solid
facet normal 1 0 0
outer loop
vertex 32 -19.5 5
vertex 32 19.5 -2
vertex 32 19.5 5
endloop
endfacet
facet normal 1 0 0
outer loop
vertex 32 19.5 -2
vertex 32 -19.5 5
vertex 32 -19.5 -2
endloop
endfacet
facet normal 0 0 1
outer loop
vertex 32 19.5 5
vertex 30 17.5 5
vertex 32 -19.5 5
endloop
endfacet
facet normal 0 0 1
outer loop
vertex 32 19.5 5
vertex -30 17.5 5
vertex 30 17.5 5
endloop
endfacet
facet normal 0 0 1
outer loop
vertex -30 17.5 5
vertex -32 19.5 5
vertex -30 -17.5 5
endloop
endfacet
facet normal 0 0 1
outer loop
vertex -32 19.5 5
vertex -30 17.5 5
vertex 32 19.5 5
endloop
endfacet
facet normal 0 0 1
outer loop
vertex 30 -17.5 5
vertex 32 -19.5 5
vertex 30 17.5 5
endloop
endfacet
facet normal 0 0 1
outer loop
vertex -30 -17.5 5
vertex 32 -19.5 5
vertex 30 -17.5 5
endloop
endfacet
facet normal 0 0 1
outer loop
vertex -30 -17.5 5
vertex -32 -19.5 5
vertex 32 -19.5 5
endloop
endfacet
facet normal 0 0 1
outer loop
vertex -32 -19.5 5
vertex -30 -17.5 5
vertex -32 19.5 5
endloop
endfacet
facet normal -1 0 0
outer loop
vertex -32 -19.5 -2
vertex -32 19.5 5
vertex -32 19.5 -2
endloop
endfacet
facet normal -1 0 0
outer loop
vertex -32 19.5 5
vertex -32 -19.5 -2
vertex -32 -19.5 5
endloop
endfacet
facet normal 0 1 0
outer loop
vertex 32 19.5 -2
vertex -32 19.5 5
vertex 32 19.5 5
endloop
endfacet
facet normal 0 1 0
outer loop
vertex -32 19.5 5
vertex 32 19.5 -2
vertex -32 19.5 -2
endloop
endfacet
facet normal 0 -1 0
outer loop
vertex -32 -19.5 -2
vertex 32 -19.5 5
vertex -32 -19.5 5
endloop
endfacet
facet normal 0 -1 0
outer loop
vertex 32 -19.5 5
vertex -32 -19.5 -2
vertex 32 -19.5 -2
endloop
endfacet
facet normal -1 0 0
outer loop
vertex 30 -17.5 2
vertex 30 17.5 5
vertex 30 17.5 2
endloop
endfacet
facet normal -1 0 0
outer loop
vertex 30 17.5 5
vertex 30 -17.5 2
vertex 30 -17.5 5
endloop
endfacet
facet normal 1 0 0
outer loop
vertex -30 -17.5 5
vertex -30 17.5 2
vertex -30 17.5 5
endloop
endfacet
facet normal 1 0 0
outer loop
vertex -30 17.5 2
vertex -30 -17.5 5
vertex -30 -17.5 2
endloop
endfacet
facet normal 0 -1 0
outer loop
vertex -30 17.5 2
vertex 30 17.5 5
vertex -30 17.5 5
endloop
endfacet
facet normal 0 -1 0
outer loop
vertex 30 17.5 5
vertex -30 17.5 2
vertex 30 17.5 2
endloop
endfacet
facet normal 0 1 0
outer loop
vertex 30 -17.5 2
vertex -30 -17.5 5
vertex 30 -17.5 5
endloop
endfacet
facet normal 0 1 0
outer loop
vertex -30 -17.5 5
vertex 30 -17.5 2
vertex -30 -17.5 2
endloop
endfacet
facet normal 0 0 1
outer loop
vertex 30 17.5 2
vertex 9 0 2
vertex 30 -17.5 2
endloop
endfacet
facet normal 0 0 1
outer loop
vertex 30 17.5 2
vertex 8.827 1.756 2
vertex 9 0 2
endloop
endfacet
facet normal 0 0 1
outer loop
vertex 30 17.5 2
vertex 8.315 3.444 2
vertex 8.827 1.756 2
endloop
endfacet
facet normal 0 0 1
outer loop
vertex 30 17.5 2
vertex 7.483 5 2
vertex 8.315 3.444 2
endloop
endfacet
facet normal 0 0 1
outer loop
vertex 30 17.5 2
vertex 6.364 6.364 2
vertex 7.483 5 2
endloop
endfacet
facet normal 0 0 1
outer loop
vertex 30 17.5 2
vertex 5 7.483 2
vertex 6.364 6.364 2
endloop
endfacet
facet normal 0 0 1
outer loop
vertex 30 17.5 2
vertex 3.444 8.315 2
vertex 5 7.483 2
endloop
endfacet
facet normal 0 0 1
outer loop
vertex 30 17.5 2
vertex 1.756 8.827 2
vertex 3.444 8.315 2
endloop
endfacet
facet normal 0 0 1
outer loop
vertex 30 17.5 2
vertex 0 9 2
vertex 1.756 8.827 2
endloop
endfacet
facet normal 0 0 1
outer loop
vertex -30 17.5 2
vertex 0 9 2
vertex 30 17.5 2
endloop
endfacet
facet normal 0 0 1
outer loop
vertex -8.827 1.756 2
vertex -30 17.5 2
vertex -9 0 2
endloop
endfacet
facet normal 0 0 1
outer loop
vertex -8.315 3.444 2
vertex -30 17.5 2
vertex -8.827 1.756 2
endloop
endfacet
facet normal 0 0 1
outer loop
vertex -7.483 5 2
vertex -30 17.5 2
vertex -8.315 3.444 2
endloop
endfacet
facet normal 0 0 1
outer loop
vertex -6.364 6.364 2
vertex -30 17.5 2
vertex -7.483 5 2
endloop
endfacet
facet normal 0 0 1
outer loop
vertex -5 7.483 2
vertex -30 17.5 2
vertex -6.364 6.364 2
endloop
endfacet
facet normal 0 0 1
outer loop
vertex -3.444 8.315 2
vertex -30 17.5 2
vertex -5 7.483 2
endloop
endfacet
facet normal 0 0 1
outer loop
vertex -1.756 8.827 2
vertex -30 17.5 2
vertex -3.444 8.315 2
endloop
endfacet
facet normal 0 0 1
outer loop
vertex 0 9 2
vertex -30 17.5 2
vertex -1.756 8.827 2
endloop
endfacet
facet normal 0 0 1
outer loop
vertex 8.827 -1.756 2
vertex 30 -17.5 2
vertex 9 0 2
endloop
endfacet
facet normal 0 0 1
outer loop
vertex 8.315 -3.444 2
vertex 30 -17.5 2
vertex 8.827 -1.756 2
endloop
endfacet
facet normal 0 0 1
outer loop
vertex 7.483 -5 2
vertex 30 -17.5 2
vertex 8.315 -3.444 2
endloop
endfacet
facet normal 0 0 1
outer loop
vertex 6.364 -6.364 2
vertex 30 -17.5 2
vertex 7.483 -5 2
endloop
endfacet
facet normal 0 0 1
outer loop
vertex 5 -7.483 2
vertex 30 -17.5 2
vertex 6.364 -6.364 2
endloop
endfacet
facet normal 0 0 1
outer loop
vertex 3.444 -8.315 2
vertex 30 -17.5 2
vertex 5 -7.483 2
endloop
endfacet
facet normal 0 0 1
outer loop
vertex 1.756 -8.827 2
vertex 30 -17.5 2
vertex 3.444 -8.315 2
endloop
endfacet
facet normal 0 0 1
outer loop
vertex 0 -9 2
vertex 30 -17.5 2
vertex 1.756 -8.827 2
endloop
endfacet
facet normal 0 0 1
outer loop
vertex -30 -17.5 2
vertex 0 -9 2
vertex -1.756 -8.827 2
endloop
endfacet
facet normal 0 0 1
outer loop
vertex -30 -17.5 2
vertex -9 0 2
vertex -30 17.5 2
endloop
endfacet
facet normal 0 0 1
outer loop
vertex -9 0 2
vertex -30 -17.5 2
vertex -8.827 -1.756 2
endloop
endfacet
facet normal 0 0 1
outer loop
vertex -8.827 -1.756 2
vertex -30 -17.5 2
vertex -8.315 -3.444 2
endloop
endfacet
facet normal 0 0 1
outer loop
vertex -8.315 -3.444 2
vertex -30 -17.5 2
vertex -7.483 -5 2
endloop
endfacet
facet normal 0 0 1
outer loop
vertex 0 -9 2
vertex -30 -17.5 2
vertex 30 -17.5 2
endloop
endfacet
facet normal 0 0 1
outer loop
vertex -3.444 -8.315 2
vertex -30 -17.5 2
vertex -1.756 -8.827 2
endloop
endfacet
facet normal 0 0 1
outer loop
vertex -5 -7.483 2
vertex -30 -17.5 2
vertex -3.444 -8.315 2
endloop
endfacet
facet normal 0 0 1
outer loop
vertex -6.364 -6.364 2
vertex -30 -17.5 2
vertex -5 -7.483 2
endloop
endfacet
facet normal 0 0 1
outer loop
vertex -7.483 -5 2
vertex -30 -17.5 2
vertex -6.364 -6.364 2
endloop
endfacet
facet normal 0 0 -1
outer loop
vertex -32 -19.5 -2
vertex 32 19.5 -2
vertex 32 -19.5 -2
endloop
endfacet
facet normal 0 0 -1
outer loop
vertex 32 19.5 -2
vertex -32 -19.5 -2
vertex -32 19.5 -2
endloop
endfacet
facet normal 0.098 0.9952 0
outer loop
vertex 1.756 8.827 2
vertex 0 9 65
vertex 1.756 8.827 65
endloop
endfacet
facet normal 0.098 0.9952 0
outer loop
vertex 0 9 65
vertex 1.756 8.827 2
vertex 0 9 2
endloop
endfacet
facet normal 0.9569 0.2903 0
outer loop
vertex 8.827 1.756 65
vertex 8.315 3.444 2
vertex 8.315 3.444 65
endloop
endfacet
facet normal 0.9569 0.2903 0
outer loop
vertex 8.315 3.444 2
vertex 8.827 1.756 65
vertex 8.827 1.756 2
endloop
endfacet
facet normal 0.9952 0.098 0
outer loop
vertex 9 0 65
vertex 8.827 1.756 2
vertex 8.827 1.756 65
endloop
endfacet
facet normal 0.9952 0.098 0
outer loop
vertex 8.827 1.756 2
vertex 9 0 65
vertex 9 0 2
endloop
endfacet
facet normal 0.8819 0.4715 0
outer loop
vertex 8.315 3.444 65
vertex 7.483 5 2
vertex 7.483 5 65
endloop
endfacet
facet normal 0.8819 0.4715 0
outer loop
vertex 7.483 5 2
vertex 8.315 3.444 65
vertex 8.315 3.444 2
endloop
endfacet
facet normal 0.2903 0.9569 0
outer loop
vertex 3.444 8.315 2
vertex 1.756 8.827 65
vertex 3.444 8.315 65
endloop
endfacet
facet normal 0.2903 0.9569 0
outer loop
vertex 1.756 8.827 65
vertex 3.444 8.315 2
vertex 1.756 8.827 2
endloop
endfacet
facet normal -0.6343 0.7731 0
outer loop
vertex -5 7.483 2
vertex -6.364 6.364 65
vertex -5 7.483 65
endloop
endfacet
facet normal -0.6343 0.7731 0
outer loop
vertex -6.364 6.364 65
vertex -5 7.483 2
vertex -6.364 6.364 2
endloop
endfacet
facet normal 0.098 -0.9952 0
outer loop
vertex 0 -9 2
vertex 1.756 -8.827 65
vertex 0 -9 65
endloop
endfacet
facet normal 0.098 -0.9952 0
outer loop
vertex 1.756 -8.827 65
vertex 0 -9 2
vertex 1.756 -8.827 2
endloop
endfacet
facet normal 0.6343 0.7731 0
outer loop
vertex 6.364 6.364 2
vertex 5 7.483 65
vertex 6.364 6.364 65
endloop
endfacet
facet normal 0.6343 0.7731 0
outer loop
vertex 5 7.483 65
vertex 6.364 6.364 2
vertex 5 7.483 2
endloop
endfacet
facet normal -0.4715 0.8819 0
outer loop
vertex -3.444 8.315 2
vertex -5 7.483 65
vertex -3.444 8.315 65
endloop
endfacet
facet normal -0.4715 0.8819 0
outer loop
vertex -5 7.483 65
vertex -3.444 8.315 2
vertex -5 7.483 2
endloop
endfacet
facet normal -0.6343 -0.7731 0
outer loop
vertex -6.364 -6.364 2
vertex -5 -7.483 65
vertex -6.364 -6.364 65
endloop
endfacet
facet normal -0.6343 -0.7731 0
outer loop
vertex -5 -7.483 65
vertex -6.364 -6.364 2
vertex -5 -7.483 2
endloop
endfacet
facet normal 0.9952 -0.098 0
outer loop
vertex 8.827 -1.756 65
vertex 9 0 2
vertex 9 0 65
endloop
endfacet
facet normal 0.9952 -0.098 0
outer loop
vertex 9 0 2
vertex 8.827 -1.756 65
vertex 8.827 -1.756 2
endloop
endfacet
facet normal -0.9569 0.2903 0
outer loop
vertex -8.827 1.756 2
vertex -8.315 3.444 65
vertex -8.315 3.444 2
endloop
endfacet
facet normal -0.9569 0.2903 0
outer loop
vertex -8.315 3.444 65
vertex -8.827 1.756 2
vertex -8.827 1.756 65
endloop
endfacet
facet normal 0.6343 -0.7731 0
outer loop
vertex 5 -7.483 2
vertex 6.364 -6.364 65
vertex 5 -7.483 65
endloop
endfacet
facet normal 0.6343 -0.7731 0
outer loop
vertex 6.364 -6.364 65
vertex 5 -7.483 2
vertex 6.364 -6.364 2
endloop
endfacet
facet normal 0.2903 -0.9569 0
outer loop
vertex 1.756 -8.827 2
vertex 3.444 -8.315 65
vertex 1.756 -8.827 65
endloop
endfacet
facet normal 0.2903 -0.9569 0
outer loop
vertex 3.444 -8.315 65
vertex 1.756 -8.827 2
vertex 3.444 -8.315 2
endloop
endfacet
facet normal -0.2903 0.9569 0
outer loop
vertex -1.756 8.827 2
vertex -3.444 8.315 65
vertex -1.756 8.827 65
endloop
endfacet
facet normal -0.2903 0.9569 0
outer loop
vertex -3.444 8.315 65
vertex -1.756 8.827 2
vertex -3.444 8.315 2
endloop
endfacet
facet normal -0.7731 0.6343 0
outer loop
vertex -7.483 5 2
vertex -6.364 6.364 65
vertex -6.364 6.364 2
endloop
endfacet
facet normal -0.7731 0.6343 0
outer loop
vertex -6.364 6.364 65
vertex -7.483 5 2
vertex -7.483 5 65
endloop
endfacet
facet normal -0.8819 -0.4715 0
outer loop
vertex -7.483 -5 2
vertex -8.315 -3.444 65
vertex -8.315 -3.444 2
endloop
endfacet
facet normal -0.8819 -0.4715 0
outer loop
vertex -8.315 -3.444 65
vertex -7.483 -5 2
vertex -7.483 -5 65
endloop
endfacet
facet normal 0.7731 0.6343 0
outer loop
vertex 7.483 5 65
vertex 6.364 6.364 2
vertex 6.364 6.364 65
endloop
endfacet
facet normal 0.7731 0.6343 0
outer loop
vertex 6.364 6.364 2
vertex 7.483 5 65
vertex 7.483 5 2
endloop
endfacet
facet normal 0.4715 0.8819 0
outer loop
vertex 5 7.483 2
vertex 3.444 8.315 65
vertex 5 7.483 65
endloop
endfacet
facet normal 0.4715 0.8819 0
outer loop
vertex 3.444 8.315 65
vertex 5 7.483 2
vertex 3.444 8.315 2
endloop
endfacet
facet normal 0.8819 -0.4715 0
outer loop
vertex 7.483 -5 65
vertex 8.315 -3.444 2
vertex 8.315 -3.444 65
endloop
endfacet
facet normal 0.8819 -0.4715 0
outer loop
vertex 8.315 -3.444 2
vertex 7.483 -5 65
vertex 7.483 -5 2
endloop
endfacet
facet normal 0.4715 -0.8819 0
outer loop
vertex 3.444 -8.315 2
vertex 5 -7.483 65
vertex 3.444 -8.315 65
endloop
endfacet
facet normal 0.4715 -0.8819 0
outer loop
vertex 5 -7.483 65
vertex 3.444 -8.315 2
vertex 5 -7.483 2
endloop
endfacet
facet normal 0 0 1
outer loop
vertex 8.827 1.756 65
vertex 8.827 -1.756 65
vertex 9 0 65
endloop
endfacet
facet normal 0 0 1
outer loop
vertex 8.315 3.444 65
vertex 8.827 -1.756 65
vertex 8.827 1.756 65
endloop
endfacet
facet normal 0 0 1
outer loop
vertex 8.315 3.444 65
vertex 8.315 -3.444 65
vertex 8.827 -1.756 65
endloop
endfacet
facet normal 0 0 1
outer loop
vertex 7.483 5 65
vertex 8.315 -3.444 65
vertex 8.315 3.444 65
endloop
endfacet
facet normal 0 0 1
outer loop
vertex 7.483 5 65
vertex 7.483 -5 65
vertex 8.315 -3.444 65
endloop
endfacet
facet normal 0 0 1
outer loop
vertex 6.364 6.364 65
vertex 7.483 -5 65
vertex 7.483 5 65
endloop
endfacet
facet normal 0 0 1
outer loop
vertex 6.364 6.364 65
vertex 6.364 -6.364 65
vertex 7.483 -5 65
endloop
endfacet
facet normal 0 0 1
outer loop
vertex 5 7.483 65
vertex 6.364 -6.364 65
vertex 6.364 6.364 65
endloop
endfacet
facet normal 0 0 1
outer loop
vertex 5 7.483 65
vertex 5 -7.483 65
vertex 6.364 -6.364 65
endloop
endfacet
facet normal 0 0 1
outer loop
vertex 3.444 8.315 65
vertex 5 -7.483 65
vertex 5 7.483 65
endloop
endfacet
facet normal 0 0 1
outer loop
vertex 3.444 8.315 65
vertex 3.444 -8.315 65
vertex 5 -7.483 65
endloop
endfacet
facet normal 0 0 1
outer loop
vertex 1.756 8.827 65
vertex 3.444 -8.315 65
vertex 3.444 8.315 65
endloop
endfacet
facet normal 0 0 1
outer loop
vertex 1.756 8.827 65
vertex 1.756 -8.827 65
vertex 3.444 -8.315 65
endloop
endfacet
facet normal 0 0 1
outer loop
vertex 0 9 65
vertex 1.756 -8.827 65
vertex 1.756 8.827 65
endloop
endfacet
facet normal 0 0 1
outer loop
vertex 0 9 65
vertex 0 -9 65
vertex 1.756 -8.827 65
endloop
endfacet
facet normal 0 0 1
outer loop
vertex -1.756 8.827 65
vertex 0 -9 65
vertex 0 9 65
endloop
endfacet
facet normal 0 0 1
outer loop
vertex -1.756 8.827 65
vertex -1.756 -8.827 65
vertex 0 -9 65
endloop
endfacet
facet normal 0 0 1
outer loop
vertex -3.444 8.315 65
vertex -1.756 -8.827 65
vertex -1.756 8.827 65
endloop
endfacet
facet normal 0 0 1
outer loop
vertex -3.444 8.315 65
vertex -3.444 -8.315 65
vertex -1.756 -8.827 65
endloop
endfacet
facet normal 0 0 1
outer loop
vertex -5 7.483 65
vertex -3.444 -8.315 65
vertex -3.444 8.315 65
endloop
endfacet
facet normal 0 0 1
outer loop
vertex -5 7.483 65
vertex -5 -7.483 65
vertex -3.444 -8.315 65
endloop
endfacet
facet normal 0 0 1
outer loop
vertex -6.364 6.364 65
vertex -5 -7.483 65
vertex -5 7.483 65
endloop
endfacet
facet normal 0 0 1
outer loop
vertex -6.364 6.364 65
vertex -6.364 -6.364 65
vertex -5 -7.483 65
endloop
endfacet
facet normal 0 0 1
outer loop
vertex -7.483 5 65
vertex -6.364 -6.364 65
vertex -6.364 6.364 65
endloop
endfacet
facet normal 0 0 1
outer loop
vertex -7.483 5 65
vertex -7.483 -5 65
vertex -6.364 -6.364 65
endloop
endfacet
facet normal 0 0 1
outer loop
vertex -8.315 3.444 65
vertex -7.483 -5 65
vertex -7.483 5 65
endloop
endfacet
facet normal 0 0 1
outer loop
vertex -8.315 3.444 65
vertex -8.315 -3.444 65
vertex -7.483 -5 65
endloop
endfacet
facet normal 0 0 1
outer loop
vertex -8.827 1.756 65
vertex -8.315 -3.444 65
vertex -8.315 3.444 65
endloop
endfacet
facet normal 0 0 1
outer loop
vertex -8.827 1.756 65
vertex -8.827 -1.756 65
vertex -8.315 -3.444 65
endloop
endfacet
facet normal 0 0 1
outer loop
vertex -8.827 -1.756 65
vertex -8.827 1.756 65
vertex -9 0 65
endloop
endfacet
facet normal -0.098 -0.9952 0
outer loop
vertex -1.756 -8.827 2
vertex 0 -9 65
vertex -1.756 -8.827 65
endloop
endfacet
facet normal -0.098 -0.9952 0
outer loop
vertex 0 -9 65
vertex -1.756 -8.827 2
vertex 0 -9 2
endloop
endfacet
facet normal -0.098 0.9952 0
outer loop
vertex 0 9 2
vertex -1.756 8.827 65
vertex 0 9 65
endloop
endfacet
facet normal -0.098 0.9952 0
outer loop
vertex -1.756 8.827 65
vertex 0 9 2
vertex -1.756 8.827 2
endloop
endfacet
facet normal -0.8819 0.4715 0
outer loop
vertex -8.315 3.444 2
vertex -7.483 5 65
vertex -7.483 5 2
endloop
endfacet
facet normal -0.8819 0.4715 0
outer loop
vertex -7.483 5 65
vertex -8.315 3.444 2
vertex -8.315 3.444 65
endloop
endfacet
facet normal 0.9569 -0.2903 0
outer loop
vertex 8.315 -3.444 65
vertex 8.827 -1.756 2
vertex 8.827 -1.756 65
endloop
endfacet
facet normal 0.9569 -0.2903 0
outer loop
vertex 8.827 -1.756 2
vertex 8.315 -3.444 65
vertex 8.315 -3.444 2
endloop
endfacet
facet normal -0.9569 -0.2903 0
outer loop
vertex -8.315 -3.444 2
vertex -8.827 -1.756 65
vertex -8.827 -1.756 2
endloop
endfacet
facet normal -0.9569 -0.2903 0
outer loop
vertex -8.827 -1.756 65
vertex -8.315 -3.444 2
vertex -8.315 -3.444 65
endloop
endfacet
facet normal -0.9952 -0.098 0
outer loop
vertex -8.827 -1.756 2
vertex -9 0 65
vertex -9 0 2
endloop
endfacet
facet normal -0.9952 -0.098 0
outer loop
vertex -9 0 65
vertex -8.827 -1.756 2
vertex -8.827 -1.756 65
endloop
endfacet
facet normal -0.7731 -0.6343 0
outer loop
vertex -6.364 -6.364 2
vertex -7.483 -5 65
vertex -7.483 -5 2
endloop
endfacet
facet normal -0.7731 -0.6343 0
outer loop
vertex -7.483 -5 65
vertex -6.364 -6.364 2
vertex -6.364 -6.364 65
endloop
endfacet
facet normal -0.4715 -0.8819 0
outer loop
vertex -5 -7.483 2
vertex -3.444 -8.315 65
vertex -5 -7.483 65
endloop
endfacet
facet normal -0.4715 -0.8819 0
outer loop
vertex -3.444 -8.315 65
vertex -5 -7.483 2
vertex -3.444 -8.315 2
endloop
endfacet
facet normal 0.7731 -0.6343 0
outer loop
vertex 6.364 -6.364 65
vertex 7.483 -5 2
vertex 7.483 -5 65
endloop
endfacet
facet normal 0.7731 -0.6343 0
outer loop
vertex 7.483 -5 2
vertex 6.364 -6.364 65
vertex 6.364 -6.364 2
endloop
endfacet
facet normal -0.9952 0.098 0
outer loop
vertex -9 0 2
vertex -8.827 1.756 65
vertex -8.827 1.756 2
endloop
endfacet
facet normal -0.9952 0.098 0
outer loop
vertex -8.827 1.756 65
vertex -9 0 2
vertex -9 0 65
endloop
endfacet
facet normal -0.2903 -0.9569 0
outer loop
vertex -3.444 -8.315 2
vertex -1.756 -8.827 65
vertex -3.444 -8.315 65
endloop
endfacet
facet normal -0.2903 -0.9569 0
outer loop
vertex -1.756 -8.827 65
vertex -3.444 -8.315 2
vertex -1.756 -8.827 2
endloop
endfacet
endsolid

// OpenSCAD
// file: akum18650.scad
echo("Работа Поздеевой Александры!");

akum18650();

module akum18650(){
    color("purple")
    cylinder(d=18, h=65, $fn=32);
}
// main file
use <akum18650.scad>

echo("Работа Поздеевой Александры!");
w_frame = 65;
d_frame = 5;
h_frame = 40;
thickness_frame = 4;
thickness_walls = 2;
thickness_bottom = 2;

w_back = 60;
h_back = 35;
thickness_back = 1;
h_walls = 4;


// frame1();

// rotate([90, 0, 0])
// translate([0, 0, 3])
// backlight();
kit_frame();
akum18650();

module kit_frame() {
    bottom();
    color("black")
    translate([0, 0, h_walls/2 + thickness_bottom/2])
    walls(); 
}
module walls() {
    difference() {
    cube([w_back +2*thickness_walls, h_back+2*thickness_walls,h_walls], center=true);
    color("red")
    cube([w_back, h_back, h_walls+1], center=true);
    }
}
module bottom() {
cube([w_back +2*thickness_walls, h_back+2*thickness_walls,h_walls], center=true);
}

module backlight(){
color("lightgreen")
cube([w_back, h_back, thickness_back], center=true);
}

module frame1() {
    difference() {
        cube([w_frame, d_frame, h_frame],center=true);
        color("red")
        cube([w_frame-2*thickness_frame, d_frame+1, h_frame-2*thickness_frame], center=true);
    }
}
